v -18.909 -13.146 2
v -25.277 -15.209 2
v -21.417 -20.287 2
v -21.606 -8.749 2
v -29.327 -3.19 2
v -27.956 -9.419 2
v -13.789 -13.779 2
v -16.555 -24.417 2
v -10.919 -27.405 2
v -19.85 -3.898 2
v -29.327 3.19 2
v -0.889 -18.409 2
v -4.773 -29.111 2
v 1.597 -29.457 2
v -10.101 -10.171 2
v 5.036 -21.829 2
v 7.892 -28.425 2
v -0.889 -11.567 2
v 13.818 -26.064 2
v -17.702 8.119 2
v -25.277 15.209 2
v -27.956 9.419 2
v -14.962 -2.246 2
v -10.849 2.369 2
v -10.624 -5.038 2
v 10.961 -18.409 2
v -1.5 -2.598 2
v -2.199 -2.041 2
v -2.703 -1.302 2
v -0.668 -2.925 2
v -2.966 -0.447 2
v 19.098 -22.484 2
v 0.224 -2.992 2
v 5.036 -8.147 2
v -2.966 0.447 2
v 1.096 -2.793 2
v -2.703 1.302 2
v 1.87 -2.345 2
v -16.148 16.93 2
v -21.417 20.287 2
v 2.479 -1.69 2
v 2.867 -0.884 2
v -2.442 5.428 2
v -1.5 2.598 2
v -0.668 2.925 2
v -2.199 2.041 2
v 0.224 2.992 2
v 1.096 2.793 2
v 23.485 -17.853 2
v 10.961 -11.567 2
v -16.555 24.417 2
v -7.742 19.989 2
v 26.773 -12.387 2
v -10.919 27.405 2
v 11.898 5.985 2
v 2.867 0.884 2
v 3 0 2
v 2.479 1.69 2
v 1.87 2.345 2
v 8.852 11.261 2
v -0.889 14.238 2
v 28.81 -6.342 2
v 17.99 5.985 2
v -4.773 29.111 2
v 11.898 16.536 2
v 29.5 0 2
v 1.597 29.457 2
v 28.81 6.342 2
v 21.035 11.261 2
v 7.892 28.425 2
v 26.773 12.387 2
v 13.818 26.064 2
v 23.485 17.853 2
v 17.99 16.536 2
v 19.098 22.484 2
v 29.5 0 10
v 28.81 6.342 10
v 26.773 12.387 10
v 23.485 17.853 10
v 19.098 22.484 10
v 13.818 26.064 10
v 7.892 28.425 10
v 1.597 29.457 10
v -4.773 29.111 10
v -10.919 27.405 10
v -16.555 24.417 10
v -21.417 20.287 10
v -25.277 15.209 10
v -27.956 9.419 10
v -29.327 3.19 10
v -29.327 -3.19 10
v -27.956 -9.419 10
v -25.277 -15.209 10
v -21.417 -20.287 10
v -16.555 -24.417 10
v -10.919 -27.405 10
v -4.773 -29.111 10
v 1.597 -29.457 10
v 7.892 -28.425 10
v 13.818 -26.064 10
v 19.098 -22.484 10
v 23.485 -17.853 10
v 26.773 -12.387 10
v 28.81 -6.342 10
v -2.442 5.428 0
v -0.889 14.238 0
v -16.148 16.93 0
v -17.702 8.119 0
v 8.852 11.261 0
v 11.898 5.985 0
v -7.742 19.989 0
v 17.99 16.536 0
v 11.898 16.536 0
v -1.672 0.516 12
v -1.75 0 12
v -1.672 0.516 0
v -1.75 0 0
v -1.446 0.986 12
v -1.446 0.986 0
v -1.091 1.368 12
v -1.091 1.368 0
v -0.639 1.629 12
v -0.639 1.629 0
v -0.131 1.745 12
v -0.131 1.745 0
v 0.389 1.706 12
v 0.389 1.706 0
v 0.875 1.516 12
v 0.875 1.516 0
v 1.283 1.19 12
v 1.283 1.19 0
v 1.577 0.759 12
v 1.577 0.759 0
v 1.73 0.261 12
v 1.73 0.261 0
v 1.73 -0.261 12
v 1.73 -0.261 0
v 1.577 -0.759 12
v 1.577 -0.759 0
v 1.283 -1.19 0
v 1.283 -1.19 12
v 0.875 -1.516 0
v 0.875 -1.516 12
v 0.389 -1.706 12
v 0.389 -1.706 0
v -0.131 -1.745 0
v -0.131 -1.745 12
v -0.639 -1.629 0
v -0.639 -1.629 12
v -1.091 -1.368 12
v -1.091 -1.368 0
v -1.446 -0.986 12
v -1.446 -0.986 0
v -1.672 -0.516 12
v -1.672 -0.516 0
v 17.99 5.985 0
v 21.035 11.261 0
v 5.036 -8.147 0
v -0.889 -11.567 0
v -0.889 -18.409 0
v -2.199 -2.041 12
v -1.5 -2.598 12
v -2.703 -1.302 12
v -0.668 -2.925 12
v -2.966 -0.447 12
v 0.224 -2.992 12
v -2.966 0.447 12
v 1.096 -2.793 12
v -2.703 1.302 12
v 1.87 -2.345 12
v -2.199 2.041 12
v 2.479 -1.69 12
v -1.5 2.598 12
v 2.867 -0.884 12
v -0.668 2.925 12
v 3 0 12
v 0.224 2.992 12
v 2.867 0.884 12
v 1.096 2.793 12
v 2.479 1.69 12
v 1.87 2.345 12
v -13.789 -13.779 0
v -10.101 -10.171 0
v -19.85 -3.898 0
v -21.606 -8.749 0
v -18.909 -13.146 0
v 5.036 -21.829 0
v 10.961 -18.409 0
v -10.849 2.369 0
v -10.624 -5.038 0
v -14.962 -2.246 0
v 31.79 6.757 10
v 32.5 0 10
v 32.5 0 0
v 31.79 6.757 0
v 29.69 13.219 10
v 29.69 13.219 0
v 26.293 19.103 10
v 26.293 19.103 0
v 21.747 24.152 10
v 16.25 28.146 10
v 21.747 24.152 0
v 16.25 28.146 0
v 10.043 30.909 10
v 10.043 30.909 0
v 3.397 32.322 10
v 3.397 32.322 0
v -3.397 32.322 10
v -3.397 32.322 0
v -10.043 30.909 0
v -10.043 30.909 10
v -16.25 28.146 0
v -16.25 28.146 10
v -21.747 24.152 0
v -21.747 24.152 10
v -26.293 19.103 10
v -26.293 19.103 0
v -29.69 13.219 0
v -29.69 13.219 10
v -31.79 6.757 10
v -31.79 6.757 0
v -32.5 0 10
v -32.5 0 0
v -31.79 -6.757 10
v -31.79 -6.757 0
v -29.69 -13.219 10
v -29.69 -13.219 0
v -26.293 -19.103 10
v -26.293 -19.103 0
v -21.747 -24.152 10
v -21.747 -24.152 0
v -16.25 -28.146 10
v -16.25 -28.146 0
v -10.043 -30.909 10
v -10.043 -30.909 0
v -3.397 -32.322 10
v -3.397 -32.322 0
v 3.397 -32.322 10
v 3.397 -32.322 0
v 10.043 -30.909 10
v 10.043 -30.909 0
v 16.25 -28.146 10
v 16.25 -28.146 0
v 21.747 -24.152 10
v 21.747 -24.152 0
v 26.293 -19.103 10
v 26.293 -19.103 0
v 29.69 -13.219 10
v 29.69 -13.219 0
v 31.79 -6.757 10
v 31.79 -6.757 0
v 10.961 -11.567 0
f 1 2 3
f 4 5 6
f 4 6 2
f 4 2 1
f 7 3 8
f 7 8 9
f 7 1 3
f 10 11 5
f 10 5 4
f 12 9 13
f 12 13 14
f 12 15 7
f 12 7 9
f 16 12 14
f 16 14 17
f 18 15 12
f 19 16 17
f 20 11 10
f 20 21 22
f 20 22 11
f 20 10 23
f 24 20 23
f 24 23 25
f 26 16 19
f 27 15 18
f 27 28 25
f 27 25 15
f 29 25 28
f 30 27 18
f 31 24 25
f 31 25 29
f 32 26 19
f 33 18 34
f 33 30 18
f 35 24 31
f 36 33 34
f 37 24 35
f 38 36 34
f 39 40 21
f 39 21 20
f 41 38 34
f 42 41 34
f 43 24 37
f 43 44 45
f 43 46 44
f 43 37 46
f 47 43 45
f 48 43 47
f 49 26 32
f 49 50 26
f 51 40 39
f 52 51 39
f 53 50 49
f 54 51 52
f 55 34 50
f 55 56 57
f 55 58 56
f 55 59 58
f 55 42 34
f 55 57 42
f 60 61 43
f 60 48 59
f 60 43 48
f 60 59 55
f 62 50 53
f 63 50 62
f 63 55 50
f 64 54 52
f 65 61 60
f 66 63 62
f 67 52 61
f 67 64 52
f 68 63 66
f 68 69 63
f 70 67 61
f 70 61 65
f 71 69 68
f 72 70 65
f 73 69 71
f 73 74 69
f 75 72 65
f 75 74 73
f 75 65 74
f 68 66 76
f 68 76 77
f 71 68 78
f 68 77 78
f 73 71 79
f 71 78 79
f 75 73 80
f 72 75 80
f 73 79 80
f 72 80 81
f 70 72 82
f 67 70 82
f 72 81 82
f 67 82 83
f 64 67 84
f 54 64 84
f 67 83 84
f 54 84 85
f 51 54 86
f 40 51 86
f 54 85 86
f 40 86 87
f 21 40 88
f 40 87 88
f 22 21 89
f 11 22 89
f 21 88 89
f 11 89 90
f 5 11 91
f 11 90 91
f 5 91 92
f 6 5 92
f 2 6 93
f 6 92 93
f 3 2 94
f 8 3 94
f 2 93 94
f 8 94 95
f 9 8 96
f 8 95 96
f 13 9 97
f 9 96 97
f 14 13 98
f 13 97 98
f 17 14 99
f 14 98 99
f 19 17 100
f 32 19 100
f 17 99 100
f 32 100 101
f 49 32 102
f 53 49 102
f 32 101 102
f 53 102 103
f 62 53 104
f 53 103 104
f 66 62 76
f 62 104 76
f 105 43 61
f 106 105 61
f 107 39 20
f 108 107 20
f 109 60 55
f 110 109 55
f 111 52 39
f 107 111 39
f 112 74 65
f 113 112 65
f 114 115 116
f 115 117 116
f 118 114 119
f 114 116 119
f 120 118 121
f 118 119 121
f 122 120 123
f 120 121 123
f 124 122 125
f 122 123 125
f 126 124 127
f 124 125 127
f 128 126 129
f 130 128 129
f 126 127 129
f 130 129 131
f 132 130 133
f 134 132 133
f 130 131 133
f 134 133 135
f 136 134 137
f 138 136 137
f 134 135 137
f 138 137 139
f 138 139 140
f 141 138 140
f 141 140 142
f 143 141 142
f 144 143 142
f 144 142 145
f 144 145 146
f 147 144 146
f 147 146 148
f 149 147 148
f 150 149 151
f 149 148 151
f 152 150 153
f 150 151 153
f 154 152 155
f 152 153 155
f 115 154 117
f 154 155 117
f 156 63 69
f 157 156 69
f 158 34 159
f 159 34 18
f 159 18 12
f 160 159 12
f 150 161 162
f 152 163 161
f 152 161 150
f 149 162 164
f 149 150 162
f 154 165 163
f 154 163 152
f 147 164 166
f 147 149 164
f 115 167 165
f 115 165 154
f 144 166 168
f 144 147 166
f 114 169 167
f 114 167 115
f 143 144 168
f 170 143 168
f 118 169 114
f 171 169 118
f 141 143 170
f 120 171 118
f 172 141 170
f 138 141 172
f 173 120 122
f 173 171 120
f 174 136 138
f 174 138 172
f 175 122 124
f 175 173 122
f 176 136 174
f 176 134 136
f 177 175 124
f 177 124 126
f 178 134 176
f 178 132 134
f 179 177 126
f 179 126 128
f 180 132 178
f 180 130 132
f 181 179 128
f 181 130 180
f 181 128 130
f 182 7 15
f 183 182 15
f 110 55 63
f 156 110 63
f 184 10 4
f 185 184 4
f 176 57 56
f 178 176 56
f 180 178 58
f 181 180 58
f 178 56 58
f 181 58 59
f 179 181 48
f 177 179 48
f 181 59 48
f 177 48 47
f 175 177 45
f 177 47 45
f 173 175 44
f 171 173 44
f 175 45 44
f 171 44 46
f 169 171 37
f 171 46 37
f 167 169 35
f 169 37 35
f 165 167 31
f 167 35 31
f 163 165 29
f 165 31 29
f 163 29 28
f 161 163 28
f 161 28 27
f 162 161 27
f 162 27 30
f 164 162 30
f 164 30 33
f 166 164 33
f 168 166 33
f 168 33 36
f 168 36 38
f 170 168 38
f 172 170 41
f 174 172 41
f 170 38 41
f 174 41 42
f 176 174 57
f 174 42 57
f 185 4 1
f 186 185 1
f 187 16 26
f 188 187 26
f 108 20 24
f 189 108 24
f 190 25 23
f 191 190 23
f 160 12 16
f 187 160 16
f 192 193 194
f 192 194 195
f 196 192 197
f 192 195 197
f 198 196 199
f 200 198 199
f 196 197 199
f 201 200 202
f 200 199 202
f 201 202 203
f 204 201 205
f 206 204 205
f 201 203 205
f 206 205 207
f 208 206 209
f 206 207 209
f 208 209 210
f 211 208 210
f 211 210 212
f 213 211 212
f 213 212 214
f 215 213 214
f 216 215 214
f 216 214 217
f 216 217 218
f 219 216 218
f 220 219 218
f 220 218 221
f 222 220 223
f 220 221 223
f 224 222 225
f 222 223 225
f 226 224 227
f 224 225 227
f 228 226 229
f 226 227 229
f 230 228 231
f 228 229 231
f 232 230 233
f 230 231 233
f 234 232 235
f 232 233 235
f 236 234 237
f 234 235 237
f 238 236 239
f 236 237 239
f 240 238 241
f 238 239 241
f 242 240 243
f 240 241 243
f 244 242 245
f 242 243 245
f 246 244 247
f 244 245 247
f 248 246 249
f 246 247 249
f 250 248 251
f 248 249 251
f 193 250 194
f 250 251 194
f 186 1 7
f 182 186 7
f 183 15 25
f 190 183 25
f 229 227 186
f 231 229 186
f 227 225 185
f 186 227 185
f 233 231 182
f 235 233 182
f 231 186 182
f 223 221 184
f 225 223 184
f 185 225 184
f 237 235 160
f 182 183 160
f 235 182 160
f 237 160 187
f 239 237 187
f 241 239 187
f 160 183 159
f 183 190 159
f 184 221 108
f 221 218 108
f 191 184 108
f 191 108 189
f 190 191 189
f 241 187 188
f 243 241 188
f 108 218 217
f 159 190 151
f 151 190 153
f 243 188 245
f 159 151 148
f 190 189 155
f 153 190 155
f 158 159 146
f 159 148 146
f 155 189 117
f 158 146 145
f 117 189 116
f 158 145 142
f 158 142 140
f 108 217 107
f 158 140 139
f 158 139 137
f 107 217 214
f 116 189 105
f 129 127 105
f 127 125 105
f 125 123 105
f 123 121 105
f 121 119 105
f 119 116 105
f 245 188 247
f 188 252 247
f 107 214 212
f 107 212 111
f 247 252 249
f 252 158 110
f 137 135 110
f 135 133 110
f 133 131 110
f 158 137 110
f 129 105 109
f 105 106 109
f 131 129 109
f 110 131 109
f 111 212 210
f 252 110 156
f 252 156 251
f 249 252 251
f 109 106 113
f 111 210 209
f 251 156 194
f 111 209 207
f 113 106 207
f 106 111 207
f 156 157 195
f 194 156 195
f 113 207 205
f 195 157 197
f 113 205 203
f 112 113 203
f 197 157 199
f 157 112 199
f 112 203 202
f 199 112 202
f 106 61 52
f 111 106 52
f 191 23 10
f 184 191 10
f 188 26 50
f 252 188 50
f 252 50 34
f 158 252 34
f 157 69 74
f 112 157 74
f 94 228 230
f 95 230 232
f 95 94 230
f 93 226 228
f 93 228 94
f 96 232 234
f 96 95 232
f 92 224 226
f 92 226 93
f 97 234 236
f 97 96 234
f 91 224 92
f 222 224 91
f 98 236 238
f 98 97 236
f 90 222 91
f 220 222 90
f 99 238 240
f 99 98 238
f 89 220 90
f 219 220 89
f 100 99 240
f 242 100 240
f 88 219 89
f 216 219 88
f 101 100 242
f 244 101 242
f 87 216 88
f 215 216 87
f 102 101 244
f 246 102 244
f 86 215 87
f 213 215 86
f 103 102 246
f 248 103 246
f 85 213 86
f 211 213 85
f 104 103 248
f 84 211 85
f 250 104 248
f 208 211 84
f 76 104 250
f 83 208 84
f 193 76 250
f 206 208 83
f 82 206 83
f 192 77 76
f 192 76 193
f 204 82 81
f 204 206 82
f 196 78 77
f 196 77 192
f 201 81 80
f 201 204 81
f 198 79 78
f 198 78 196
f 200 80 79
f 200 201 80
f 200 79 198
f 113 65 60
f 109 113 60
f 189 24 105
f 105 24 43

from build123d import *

# Parameters (mm, degrees)
F0_R      = 32.5
F1_DEPTH  = 10
F2_R      = 29.5
F3_DEPTH  = 8
F6_D      = 3.5
F8_DEPTH  = 2
F9_DEPTH  = 2
F10_DEPTH = 2
F11_DEPTH = 2
F4_R      = 3
F12_DEPTH = 10
F14_D     = 3.5


# Not quite as in the source:
# - the program builds the solid bodies; features that only make, move or delete a surface that nothing else refers to are left out


with BuildPart() as f1:
    # F0 (on Top) → F1 (new body)
    with BuildSketch(Plane.XY):
        Circle(F0_R)
    extrude(amount=F1_DEPTH)

    # F2 (on face) → F3 (cut)
    with BuildSketch(Plane.XY.offset(10)):
        Circle(F2_R)
    extrude(amount=-F3_DEPTH, mode=Mode.SUBTRACT)

    # F6 (through all)
    with Locations(Plane(origin=(0, 0, 0), x_dir=(1, 0, 0), z_dir=(0, 0, -1))):
        with Locations((0, 0)):
            Hole(F6_D / 2)

    # F7 (on face) → F8 (cut, through all)
    with BuildSketch(Plane.XY.offset(2)):
        Polygon((-7.741649435, 19.9890607288), (-16.1482516815, 16.9295235286), (-17.7019158656, 8.1194238235), (-10.8489778032, 2.3688613186), (-2.4423755567, 5.4283985188), (-0.8887113726, 14.2384982239), align=None)
    extrude(amount=-F8_DEPTH, mode=Mode.SUBTRACT)

    # F7 (on face) → F9 (cut, through all)
    with BuildSketch(Plane.XY.offset(2)):
        Polygon((-0.8887113726, -11.5674306203), (-0.8887113726, -18.4087138127), (5.0360136665, -21.8293554089), (10.9607387056, -18.4087138127), (10.9607387056, -11.5674306203), (5.0360136665, -8.1467890241), align=None)
    extrude(amount=-F9_DEPTH, mode=Mode.SUBTRACT)

    # F7 (on face) → F10 (cut, through all)
    with BuildSketch(Plane.XY.offset(2)):
        Polygon((-13.7885178521, -13.7792561938), (-10.1013832644, -10.1707357179), (-10.6237473641, -5.0381421005), (-14.9622593298, -2.2464230215), (-19.8499311619, -3.897799888), (-21.6062462804, -8.7487522375), (-18.9086635788, -13.1464140096), align=None)
    extrude(amount=-F10_DEPTH, mode=Mode.SUBTRACT)

    # F7 (on face) → F11 (cut, through all)
    with BuildSketch(Plane.XY.offset(2)):
        Polygon((11.8978734544, 5.9852199629), (17.9896090695, 5.9852199629), (21.0354768771, 11.2608177587), (17.9896090695, 16.5364155546), (11.8978734544, 16.5364155546), (8.8520056468, 11.2608177587), align=None)
    extrude(amount=-F11_DEPTH, mode=Mode.SUBTRACT)

    # F4 (on face) → F12 (join)
    with BuildSketch(Plane.XY.offset(2)):
        Circle(F4_R)
    extrude(amount=F12_DEPTH)

    # F14 (through all)
    with Locations(Plane.XY.offset(12)):
        with Locations((0, 0)):
            Hole(F14_D / 2)


solid = f1.part
